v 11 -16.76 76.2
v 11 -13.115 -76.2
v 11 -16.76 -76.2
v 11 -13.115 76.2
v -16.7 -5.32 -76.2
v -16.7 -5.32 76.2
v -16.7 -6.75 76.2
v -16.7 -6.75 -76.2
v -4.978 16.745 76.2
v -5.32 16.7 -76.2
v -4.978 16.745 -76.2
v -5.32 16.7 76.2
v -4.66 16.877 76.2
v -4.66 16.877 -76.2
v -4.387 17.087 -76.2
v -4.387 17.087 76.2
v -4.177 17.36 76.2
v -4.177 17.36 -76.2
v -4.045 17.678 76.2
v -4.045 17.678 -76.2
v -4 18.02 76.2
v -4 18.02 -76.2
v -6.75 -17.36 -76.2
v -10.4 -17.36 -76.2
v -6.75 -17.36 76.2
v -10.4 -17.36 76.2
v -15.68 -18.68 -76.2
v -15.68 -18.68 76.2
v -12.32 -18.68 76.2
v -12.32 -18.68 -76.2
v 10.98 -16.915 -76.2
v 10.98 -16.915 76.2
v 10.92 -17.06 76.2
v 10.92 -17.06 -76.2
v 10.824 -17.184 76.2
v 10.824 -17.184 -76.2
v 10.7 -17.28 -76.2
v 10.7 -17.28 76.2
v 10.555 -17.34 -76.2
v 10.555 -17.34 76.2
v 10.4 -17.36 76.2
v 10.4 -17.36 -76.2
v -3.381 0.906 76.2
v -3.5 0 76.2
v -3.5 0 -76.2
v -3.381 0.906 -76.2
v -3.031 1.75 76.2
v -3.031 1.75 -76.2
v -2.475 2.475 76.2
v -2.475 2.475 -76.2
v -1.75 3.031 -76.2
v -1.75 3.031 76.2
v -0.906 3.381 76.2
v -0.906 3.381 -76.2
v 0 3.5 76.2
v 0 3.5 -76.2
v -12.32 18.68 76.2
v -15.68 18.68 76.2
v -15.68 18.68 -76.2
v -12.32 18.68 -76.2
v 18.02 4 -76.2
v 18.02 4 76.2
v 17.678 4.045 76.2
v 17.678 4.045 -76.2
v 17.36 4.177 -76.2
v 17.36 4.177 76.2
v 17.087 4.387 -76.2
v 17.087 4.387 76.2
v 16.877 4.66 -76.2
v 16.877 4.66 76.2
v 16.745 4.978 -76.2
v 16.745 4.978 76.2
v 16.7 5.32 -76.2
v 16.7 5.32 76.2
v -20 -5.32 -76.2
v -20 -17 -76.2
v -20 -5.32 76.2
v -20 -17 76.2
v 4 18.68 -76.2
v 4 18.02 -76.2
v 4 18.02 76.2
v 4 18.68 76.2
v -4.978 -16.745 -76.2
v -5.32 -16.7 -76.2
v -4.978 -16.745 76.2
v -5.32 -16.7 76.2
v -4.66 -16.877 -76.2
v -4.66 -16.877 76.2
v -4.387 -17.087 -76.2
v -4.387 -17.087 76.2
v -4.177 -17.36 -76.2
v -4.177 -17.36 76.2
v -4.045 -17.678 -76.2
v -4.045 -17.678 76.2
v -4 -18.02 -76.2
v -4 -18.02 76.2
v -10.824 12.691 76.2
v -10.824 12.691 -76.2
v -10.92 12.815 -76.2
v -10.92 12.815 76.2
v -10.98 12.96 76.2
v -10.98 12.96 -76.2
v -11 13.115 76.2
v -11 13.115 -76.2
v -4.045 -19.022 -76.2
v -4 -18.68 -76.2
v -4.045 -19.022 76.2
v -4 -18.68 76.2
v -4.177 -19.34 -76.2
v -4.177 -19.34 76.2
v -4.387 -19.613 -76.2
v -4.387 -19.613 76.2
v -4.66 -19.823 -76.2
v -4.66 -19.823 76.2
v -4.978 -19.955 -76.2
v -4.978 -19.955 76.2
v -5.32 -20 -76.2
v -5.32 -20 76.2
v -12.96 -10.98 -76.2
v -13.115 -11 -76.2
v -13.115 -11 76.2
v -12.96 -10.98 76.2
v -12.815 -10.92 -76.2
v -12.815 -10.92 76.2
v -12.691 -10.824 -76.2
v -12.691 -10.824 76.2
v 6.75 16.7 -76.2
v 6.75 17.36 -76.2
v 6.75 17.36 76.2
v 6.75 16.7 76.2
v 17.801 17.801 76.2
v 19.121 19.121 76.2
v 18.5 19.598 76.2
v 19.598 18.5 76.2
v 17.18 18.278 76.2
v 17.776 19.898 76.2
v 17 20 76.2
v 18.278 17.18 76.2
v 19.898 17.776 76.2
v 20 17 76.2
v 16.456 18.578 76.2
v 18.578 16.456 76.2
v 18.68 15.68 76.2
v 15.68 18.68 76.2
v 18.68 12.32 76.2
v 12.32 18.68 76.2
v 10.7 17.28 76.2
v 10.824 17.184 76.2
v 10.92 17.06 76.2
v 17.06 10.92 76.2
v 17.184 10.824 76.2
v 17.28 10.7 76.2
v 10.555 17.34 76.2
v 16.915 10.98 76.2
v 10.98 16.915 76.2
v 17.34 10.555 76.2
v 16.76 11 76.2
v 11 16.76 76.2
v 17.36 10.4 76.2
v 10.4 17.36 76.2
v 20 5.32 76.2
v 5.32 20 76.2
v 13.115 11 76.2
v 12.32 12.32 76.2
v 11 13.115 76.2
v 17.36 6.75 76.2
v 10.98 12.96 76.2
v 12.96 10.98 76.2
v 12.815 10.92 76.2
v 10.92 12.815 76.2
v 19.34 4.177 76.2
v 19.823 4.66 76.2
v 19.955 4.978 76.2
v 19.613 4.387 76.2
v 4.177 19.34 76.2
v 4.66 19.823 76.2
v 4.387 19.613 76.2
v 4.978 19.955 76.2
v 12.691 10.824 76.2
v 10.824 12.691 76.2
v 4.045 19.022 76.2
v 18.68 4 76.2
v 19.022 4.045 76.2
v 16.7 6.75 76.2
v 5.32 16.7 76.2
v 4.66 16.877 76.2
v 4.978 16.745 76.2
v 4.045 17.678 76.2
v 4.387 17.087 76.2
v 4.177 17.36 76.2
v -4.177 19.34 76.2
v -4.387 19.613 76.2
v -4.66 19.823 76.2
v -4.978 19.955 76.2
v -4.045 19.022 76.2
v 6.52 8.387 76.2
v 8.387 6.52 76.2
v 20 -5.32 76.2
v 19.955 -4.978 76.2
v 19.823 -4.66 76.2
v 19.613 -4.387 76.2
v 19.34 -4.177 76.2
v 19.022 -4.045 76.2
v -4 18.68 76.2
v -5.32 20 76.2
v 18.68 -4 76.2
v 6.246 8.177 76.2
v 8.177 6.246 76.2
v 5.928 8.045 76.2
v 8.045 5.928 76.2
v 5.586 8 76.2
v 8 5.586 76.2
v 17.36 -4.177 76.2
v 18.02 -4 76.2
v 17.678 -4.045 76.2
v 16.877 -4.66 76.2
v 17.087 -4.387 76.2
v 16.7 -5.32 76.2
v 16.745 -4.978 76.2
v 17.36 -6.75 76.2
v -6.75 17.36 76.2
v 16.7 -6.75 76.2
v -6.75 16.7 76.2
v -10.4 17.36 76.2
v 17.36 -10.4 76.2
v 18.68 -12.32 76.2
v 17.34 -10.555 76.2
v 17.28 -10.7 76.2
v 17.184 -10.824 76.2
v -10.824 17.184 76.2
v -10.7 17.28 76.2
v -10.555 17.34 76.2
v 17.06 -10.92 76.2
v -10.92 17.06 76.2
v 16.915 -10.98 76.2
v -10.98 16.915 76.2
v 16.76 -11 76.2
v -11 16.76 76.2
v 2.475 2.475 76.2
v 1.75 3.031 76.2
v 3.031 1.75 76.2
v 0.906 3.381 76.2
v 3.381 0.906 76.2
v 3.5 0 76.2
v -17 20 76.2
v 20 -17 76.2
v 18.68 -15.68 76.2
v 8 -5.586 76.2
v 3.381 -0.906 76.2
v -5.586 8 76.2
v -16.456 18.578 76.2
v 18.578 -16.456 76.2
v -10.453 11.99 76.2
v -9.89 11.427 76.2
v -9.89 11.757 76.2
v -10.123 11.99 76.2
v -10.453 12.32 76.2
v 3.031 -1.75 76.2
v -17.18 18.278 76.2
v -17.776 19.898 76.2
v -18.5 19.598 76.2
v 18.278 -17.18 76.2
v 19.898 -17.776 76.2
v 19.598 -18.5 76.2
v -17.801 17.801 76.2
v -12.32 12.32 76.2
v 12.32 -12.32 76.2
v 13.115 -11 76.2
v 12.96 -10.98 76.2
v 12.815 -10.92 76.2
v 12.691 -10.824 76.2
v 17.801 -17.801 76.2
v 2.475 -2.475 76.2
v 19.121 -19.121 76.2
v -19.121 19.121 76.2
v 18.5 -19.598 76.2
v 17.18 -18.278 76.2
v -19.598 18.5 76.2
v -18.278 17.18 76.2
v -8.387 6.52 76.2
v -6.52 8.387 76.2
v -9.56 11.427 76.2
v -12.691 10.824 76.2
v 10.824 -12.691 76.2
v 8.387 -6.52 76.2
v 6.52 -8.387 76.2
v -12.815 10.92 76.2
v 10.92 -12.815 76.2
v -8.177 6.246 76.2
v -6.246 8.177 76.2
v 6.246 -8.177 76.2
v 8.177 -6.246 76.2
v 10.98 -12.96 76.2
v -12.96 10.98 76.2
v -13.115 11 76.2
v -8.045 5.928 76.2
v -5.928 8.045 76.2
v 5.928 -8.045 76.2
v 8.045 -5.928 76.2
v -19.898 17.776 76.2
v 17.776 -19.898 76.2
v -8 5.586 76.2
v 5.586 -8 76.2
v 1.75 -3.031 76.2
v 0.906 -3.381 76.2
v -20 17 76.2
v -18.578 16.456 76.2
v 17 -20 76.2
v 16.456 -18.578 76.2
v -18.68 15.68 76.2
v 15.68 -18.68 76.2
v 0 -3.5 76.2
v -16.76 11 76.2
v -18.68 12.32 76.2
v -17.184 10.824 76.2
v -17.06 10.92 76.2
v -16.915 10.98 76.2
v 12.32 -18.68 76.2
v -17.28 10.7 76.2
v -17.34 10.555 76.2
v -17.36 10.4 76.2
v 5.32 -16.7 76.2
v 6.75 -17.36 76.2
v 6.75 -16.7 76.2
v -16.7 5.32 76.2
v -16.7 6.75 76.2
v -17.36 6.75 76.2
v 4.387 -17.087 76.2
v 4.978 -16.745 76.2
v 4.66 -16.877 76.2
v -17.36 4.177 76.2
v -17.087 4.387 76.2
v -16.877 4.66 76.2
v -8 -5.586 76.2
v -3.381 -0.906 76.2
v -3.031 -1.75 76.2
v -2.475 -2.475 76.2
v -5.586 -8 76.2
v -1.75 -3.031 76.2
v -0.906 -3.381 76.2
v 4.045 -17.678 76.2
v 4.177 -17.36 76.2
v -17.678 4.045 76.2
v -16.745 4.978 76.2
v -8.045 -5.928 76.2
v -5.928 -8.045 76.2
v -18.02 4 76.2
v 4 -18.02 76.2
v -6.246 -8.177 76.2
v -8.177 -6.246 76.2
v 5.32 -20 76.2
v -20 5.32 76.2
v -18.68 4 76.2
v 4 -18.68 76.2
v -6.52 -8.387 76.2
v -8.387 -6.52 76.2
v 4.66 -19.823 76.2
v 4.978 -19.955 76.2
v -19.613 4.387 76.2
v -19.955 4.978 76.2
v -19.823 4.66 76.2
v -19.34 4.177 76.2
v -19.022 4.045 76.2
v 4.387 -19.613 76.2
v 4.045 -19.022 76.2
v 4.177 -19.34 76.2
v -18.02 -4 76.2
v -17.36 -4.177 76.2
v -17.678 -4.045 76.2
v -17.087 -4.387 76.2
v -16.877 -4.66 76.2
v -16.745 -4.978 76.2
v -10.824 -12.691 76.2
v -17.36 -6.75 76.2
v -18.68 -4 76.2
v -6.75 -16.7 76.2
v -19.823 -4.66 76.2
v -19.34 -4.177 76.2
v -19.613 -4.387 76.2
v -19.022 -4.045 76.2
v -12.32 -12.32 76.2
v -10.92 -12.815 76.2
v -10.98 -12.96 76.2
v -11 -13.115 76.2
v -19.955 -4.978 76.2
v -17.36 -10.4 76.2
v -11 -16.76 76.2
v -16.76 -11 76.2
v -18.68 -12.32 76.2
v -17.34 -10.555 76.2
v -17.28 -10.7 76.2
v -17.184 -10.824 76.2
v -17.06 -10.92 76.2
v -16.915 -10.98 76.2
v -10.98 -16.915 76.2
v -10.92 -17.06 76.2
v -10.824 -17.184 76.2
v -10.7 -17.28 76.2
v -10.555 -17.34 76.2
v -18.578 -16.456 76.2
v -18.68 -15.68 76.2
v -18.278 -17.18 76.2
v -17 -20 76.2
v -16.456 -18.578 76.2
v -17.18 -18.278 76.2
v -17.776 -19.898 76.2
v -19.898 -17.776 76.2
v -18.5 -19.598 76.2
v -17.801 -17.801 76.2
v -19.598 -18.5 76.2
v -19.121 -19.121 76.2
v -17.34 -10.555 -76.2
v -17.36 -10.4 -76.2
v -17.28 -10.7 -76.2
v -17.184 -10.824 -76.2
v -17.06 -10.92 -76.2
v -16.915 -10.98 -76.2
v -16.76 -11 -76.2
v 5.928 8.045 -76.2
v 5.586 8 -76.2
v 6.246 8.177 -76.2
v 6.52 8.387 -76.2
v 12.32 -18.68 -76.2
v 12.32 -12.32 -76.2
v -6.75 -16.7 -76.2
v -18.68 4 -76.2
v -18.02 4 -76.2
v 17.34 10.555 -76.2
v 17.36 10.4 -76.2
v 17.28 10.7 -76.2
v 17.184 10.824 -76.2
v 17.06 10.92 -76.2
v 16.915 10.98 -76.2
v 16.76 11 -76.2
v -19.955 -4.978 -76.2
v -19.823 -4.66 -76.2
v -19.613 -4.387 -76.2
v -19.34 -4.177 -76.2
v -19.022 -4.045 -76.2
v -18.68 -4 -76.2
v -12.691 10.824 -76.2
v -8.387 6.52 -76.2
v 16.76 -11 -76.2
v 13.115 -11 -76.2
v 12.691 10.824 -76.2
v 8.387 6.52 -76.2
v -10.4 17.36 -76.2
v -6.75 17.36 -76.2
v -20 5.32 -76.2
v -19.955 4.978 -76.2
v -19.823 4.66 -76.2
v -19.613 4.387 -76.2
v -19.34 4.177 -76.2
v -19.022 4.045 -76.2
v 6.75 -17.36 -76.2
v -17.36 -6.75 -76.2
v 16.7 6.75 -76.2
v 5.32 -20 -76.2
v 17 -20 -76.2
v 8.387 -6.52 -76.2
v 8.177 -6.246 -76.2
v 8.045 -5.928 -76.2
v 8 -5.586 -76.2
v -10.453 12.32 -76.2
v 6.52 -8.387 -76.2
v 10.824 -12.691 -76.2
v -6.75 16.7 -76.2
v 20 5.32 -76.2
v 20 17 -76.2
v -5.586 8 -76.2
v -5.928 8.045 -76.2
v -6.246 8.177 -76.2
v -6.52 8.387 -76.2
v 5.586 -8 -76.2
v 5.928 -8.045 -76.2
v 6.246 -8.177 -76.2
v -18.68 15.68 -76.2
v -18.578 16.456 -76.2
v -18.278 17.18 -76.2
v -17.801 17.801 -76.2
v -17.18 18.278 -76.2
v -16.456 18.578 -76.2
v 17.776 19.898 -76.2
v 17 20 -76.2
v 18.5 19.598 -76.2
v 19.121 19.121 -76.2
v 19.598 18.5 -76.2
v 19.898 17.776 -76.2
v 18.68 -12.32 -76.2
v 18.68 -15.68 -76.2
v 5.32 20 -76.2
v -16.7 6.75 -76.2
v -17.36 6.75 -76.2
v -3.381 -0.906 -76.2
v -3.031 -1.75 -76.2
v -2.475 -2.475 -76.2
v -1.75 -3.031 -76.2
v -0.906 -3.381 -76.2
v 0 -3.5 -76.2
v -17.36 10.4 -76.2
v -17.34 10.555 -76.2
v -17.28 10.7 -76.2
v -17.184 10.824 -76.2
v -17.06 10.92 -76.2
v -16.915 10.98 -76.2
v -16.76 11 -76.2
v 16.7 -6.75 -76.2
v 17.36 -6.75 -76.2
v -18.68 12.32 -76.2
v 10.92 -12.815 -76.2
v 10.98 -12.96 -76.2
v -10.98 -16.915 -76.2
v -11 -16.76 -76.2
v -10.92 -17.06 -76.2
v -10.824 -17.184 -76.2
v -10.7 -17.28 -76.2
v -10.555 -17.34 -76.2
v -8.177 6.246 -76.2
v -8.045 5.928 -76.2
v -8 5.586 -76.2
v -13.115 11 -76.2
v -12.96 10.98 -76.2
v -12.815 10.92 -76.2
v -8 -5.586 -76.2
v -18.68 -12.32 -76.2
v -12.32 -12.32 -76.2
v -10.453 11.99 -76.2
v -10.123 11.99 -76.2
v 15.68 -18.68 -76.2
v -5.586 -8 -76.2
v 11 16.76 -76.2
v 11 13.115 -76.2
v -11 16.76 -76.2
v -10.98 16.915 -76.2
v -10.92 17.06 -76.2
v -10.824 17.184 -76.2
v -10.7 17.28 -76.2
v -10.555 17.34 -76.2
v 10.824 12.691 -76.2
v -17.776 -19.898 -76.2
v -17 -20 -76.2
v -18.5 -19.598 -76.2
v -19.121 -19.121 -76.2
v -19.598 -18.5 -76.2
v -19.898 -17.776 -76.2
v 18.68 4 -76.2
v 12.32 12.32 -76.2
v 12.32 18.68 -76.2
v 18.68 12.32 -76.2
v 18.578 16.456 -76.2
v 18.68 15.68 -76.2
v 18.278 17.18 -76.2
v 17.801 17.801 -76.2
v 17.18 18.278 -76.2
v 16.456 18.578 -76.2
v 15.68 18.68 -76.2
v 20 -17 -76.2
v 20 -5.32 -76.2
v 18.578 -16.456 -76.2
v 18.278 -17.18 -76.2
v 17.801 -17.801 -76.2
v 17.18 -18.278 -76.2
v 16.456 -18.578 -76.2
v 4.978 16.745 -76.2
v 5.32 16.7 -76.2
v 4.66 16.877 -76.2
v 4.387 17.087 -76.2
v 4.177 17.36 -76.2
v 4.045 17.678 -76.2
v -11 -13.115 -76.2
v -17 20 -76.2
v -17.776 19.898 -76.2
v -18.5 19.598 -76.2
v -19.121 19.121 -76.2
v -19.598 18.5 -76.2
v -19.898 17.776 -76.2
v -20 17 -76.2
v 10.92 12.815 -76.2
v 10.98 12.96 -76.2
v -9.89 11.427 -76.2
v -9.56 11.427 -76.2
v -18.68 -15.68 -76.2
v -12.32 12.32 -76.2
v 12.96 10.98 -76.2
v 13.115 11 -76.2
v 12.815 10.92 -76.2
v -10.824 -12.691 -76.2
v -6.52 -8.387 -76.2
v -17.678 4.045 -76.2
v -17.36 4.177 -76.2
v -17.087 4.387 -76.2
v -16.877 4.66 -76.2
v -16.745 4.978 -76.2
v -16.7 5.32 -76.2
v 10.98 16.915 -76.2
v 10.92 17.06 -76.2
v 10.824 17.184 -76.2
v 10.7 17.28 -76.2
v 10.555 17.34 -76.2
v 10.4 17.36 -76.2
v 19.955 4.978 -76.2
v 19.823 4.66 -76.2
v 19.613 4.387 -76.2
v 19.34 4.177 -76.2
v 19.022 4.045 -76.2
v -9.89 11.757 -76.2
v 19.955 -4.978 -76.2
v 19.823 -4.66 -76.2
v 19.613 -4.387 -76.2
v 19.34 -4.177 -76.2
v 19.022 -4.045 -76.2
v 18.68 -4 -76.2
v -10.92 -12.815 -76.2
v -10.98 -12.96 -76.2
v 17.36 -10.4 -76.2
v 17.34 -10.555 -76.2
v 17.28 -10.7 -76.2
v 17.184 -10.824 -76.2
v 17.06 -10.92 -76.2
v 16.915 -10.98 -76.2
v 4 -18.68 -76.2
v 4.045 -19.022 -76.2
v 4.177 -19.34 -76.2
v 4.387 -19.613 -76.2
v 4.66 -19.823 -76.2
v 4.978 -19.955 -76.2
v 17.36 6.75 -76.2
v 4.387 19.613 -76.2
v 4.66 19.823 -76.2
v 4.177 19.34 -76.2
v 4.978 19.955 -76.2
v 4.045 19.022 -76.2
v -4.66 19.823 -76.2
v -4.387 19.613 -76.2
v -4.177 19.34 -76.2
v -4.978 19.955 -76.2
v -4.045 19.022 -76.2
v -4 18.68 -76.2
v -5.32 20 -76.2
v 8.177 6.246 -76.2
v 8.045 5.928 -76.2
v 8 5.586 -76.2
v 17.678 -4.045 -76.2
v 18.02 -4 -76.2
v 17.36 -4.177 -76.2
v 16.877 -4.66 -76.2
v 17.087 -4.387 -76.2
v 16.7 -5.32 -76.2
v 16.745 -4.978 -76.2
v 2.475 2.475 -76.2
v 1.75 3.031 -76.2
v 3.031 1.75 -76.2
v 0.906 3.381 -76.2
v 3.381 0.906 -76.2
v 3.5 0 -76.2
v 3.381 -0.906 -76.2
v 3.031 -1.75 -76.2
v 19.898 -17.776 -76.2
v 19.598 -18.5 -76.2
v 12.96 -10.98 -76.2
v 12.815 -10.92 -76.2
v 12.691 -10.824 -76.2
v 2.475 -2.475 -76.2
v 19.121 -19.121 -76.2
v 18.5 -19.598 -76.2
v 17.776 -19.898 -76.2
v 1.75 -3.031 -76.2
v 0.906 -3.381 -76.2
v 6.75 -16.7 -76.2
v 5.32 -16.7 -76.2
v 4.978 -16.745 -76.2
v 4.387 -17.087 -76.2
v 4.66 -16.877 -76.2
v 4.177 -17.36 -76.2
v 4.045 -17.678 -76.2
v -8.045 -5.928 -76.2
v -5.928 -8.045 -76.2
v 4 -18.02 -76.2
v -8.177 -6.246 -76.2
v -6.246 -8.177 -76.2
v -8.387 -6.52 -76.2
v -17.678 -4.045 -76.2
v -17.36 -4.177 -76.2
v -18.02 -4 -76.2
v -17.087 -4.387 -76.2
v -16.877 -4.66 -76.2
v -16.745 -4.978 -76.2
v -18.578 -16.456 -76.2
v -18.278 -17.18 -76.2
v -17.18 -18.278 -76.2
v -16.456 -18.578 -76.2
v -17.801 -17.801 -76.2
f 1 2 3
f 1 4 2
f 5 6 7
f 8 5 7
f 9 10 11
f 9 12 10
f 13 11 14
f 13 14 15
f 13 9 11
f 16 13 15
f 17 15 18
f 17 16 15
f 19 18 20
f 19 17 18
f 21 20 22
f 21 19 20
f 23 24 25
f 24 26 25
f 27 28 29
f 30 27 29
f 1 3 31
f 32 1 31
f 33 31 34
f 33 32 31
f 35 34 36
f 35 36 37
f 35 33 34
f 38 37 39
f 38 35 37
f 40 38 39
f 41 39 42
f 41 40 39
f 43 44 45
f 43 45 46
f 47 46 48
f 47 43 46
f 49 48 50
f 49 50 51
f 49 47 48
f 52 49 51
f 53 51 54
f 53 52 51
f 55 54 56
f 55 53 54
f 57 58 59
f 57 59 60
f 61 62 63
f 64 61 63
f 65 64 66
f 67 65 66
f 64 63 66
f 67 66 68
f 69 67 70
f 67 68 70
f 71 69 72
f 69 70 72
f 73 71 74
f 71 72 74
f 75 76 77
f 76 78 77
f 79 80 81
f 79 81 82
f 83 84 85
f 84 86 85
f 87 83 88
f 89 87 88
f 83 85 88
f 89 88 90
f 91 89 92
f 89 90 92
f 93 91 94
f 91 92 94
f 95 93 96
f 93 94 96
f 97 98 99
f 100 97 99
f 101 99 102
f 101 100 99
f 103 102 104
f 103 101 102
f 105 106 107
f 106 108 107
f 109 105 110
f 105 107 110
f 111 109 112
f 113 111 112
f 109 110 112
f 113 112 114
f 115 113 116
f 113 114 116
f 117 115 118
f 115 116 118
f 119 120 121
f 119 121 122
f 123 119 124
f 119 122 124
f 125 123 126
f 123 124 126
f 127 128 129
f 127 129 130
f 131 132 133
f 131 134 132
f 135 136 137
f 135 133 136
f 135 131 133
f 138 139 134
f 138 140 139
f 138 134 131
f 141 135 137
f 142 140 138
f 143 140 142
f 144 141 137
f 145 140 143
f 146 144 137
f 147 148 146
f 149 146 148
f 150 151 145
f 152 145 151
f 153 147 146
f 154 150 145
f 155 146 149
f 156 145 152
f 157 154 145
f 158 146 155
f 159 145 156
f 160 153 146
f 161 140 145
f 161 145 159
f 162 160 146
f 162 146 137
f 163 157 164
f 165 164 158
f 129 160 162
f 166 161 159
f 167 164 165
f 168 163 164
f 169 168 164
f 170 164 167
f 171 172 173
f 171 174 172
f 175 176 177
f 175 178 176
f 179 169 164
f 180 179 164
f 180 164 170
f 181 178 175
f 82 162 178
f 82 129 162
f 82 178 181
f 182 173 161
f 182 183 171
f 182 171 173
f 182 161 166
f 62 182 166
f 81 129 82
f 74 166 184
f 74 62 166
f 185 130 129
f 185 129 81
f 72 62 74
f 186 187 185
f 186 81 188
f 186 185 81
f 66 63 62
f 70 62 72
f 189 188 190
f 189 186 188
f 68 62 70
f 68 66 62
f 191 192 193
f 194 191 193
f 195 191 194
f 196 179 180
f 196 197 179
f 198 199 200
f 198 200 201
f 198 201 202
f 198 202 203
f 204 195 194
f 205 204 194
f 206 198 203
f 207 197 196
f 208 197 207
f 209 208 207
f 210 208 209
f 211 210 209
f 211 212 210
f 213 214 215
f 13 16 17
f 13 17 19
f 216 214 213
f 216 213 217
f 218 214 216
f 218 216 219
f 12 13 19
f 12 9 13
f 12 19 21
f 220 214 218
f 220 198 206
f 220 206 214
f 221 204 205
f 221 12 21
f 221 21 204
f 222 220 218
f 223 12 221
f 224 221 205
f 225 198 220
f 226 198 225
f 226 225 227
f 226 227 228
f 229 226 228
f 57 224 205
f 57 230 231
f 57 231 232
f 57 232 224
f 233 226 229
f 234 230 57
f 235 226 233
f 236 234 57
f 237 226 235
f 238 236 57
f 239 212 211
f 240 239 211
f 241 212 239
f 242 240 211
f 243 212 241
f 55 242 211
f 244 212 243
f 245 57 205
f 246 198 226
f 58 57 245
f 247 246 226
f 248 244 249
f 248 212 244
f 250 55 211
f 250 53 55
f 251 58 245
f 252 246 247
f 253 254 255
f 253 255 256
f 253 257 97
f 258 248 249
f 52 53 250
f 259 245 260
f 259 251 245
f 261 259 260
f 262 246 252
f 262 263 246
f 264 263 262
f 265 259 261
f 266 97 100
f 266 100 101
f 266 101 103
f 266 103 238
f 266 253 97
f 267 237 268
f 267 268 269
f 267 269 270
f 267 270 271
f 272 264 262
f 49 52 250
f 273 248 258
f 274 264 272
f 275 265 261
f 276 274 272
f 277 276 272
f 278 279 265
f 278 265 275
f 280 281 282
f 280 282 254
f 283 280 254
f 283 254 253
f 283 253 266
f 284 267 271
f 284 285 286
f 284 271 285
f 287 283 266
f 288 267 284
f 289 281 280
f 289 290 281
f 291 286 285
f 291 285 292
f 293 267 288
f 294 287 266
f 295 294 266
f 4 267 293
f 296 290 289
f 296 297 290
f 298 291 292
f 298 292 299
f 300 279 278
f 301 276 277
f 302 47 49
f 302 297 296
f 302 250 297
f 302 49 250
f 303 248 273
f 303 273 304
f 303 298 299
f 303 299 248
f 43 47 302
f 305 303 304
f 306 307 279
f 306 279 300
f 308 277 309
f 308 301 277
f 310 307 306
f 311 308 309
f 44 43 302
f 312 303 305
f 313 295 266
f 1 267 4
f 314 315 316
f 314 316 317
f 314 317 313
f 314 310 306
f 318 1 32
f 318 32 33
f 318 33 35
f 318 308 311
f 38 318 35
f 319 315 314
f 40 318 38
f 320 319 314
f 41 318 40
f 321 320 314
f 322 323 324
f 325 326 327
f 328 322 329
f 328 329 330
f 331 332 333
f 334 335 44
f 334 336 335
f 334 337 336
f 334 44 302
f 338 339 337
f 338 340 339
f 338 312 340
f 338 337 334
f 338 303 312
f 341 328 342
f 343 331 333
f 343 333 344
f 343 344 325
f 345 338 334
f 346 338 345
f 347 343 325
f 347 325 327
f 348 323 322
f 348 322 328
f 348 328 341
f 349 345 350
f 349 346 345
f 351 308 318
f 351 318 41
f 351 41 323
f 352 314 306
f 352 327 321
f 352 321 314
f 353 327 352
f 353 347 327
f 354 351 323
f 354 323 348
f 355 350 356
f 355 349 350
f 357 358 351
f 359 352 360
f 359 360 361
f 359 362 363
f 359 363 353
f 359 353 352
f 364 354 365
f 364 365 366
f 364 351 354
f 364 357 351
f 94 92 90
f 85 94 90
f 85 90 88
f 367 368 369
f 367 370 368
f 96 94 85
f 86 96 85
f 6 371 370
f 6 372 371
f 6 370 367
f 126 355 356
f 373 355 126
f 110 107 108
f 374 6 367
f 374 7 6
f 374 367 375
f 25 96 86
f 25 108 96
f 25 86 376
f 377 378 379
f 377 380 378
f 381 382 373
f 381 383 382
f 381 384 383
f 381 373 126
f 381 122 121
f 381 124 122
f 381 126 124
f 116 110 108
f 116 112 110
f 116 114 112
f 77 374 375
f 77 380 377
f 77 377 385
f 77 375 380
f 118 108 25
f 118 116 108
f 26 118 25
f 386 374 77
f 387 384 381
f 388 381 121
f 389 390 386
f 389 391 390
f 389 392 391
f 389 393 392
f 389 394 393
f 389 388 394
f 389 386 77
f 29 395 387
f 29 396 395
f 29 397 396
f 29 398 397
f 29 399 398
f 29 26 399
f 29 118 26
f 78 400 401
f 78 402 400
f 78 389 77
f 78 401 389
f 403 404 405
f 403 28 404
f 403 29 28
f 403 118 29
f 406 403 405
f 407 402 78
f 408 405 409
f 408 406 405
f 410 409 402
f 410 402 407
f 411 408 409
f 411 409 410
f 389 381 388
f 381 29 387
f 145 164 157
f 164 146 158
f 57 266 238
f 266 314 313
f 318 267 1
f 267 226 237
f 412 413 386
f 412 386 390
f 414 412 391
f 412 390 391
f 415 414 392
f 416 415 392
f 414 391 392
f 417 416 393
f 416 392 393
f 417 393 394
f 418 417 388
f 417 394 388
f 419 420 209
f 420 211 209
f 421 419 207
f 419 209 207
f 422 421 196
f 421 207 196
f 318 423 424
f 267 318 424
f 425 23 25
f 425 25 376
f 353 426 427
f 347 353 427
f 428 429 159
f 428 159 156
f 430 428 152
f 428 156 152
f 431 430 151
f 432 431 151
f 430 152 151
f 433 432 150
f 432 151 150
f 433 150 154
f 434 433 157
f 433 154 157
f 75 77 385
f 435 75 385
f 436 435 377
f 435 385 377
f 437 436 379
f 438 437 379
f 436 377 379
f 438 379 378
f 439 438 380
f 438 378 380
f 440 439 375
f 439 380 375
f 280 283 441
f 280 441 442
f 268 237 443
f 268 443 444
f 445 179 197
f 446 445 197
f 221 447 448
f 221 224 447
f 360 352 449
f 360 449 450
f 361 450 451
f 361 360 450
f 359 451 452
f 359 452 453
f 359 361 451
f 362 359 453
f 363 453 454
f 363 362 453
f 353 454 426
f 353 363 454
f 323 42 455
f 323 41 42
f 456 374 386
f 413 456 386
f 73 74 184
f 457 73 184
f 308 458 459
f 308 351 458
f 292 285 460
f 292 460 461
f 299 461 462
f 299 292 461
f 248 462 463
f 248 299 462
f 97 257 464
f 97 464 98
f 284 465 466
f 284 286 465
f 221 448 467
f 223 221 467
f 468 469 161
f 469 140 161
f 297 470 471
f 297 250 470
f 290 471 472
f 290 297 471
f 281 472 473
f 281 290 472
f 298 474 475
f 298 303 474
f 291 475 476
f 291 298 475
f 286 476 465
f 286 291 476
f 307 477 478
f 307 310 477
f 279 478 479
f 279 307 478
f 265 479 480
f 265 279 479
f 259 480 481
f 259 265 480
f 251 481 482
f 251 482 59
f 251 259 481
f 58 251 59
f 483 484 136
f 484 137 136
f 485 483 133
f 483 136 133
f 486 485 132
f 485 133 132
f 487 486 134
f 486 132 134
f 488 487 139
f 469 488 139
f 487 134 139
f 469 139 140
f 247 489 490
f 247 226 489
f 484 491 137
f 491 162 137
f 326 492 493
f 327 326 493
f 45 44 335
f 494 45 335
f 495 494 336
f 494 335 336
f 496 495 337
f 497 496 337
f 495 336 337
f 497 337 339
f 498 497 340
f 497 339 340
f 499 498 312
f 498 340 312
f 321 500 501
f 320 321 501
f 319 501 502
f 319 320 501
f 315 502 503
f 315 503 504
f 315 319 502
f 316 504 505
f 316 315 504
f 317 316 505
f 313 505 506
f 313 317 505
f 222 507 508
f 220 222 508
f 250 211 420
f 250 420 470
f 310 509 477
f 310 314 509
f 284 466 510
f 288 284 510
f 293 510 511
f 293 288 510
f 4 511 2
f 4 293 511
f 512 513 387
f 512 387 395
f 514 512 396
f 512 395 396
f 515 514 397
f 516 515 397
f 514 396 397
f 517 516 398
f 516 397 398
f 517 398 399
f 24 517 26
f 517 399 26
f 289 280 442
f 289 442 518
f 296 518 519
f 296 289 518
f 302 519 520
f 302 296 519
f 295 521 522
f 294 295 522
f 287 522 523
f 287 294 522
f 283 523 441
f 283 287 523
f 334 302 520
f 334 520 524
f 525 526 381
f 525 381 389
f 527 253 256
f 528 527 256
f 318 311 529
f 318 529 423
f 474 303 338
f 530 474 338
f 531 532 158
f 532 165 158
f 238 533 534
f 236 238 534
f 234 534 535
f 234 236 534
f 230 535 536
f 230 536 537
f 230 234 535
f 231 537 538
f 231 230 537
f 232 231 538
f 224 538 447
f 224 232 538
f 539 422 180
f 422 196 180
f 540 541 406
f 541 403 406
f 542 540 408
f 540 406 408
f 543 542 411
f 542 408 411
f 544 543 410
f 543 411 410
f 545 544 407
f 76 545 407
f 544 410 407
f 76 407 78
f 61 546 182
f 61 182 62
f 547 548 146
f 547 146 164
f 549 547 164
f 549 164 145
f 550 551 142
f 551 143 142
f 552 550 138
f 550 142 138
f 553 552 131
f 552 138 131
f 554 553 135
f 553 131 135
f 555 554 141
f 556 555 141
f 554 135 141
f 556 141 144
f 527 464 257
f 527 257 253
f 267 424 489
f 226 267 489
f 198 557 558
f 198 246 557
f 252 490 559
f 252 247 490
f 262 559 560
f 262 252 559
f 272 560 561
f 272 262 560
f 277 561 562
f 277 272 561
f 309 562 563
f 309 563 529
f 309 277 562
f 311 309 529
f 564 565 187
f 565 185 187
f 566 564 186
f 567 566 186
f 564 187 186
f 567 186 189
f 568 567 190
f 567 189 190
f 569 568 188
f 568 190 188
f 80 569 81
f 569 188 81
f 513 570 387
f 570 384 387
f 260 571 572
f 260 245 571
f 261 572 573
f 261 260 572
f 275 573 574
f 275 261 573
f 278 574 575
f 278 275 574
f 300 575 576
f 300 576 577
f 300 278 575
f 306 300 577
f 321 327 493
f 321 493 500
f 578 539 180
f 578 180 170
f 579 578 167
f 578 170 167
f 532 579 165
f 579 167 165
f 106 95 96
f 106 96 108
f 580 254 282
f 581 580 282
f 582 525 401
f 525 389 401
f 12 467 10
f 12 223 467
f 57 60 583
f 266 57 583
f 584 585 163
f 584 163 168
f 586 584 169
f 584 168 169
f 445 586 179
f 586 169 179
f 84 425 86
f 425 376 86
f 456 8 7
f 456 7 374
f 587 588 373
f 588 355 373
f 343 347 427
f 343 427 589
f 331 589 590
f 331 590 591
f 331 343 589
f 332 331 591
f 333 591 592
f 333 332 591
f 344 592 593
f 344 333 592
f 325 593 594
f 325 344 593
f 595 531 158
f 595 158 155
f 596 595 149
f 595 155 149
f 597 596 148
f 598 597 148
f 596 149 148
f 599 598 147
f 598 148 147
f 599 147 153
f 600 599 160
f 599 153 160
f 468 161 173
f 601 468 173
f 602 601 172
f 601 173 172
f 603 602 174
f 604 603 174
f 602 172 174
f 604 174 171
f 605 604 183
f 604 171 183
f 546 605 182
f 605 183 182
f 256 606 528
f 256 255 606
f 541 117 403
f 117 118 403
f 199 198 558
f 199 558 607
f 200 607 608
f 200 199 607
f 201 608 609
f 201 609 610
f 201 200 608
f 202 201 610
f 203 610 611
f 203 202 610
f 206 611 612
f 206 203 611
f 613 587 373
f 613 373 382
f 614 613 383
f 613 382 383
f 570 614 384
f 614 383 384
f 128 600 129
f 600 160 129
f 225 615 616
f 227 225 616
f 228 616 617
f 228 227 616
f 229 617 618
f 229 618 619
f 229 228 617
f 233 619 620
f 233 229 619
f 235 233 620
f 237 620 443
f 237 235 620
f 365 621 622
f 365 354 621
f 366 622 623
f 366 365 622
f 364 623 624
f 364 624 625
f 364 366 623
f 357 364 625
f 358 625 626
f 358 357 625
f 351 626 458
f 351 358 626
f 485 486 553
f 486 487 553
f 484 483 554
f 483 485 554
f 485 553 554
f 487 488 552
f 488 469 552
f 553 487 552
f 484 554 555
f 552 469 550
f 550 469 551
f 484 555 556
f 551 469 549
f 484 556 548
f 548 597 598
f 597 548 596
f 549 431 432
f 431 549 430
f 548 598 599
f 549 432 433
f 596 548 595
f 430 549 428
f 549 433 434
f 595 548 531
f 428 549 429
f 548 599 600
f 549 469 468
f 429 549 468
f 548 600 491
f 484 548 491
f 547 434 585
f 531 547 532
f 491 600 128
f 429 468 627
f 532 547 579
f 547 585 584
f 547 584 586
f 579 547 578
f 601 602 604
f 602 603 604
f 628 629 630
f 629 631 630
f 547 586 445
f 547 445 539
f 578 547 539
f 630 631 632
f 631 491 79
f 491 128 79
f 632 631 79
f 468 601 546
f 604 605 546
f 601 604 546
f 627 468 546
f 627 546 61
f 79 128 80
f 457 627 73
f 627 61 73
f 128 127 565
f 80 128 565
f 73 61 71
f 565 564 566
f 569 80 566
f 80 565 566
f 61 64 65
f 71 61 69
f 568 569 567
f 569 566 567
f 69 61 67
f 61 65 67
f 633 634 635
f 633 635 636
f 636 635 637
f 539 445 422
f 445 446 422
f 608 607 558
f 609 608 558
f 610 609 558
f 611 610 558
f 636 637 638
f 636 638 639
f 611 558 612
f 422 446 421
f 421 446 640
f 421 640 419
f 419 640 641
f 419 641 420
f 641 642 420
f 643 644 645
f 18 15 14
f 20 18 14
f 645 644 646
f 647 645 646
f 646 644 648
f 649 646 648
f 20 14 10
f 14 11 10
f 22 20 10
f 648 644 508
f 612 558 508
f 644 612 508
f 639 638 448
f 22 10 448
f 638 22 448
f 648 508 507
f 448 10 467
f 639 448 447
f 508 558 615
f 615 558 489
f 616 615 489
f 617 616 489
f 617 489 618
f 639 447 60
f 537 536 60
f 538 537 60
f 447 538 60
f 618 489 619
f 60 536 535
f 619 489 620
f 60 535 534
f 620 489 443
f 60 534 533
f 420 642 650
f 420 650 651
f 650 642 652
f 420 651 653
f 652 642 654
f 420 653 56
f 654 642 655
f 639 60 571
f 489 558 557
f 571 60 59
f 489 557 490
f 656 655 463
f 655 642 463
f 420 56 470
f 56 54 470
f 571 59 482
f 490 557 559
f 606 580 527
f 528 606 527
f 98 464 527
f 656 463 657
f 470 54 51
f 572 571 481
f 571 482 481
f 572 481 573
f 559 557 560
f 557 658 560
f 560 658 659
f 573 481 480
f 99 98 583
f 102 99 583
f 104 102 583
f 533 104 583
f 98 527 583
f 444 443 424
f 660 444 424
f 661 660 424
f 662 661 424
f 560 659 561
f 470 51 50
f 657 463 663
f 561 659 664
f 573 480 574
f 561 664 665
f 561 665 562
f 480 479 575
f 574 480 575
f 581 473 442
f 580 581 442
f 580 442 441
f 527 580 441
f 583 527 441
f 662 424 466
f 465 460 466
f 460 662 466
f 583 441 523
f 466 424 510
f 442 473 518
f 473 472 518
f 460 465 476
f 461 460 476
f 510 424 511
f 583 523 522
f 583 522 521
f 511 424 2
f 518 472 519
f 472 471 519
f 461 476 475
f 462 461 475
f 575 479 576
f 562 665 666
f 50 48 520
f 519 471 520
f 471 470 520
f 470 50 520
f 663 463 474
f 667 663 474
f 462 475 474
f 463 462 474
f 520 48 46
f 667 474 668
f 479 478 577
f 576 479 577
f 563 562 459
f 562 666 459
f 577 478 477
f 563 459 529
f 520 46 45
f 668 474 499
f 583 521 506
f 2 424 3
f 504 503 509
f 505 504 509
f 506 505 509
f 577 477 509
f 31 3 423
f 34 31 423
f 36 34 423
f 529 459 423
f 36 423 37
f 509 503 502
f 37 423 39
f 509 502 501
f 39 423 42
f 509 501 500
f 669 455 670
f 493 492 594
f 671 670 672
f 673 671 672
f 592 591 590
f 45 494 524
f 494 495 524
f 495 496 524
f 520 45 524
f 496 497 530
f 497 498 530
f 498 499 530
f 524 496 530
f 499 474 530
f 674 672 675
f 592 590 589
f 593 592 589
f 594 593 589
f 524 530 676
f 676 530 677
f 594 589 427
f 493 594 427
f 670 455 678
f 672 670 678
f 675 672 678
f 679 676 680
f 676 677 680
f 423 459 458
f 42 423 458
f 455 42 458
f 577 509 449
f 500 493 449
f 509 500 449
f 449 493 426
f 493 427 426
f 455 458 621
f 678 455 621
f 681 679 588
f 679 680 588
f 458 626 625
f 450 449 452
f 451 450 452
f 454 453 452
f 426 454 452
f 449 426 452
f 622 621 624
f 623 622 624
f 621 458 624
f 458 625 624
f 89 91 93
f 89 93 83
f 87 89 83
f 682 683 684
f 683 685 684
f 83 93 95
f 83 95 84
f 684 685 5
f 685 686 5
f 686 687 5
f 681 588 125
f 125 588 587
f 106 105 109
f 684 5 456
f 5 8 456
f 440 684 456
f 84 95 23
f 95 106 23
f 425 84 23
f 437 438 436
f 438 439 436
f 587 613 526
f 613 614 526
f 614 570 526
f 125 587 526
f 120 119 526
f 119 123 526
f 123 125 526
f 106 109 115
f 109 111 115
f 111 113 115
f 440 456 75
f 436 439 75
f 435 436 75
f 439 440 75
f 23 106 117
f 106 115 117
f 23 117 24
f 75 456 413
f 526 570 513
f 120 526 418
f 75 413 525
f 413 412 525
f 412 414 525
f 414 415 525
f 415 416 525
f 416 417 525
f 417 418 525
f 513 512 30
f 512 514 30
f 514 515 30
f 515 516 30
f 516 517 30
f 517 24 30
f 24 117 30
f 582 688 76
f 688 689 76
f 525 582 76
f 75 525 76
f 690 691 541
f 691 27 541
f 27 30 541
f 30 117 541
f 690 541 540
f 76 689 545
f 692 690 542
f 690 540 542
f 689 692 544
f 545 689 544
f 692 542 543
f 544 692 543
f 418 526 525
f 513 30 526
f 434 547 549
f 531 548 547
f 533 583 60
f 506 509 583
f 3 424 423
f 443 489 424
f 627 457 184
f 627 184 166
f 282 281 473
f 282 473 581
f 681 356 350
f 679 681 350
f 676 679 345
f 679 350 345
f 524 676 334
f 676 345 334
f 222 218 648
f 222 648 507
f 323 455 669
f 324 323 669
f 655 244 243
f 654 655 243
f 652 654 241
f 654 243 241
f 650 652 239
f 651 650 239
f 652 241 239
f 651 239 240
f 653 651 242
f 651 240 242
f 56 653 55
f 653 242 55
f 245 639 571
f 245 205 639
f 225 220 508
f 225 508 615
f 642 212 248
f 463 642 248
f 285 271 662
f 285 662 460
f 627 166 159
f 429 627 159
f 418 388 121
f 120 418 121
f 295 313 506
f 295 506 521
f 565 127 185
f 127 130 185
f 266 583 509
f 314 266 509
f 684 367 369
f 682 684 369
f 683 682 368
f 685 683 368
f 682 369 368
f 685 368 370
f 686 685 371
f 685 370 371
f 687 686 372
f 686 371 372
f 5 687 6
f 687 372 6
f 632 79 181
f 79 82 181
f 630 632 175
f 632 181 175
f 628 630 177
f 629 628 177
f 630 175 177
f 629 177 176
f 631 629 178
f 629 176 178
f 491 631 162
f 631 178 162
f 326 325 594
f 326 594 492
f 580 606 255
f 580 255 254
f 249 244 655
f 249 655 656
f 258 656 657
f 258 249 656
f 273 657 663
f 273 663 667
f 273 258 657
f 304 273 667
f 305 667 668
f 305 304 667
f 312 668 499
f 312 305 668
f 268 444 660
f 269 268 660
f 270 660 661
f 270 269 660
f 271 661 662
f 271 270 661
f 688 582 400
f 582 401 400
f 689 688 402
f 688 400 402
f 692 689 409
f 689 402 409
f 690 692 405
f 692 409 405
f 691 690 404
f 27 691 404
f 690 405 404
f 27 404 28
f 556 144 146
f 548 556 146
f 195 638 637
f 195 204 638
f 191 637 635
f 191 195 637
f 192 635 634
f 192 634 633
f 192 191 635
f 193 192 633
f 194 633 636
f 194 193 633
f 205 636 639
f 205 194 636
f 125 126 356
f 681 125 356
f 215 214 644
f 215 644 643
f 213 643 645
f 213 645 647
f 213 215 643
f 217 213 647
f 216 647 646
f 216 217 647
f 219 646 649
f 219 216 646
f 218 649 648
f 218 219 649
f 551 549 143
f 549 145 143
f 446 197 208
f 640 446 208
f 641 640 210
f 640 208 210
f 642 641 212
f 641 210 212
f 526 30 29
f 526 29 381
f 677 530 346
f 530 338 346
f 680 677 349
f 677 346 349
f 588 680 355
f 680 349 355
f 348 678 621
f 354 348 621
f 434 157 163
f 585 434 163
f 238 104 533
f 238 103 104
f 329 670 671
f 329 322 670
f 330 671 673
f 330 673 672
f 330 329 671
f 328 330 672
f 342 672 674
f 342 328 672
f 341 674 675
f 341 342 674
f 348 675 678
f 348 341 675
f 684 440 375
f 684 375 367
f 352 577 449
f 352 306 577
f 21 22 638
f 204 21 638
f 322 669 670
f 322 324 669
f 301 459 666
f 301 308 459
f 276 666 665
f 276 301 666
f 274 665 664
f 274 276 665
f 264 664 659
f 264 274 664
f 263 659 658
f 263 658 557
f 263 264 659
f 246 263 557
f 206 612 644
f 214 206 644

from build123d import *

# Parameters (mm, degrees)
BOSS_EXTRUDE1_DEPTH     = 76.2
CUT_EXTRUDE1_DEPTH      = 77.2
CUT_EXTRUDE1_DEPTH_BACK = 77.2


with BuildPart() as part:
    # Sketch4 → Boss-Extrude1 (new body, symmetric)
    with BuildSketch(Plane.XY):
        with BuildLine():
            Line((20, -17), (20, -5.32))
            ThreePointArc((20, -5.32), (19.613380951, -4.386619049), (18.68, -4))
            Line((18.68, -4), (18.02, -4))
            ThreePointArc((18.02, -4), (17.086619049, -4.386619049), (16.7, -5.32))
            Line((16.7, -5.32), (16.7, -6.75))
            Line((16.7, -6.75), (17.36, -6.75))
            Line((17.36, -6.75), (17.36, -10.4))
            ThreePointArc((17.36, -10.4), (17.184264069, -10.824264069), (16.76, -11))
            Line((16.76, -11), (13.11529004, -11))
            ThreePointArc((13.11529004, -11), (12.88567998, -10.95432772), (12.691025971, -10.824264069))
            Line((12.691025971, -10.824264069), (8.386619049, -6.519857147))
            ThreePointArc((8.386619049, -6.519857147), (8.100479017, -6.091618326), (8, -5.586476195))
            Line((8, -5.586476195), (8, 0))
            Line((8, 0), (3.5, 0))
            ThreePointArc((3.5, 0), (2.474873734, -2.474873734), (0, -3.5))
            Line((0, -3.5), (0, -8))
            Line((0, -8), (5.586476195, -8))
            ThreePointArc((5.586476195, -8), (6.091618326, -8.100479017), (6.519857147, -8.386619049))
            Line((6.519857147, -8.386619049), (10.824264069, -12.691025971))
            ThreePointArc((10.824264069, -12.691025971), (10.95432772, -12.88567998), (11, -13.11529004))
            Line((11, -13.11529004), (11, -16.76))
            ThreePointArc((11, -16.76), (10.824264069, -17.184264069), (10.4, -17.36))
            Line((10.4, -17.36), (6.75, -17.36))
            Line((6.75, -17.36), (6.75, -16.7))
            Line((6.75, -16.7), (5.32, -16.7))
            ThreePointArc((5.32, -16.7), (4.386619049, -17.086619049), (4, -18.02))
            Line((4, -18.02), (4, -18.68))
            ThreePointArc((4, -18.68), (4.386619049, -19.613380951), (5.32, -20))
            Line((5.32, -20), (17, -20))
            ThreePointArc((17, -20), (19.121320344, -19.121320344), (20, -17))
        make_face()
        with BuildLine():
            Line((15.68, -18.68), (12.32, -18.68))
            Line((12.32, -18.68), (12.32, -12.32))
            Line((12.32, -12.32), (18.68, -12.32))
            Line((18.68, -12.32), (18.68, -15.68))
            ThreePointArc((18.68, -15.68), (17.801320344, -17.801320344), (15.68, -18.68))
        make_face(mode=Mode.SUBTRACT)
    extrude(amount=BOSS_EXTRUDE1_DEPTH, both=True)

    # Mirror1: part across plane


with BuildPart() as part_1:
    add(part.part)
    add(part.part.mirror(Plane(origin=(0, 0, 0), x_dir=(0, 0, 1), z_dir=(1, 0, 0))))

    # Mirror2: part across plane


with BuildPart() as part_2:
    add(part_1.part)
    add(part_1.part.mirror(Plane.ZX))

    # Sketch5 → Cut-Extrude1 (cut, two sides)
    with BuildSketch(Plane.XY) as cut_extrude1_sk:
        Polygon((-10.453238098, 12.32), (-10.453238098, 11.99), (-10.123238098, 11.99), (-9.88989286, 11.756654762), (-9.88989286, 11.426654762), (-9.55989286, 11.426654762), (-9.55989286, 12.32), align=None)
    extrude(amount=CUT_EXTRUDE1_DEPTH, mode=Mode.SUBTRACT)
    extrude(cut_extrude1_sk.sketch, amount=-CUT_EXTRUDE1_DEPTH_BACK, mode=Mode.SUBTRACT)


solid = part_2.part
